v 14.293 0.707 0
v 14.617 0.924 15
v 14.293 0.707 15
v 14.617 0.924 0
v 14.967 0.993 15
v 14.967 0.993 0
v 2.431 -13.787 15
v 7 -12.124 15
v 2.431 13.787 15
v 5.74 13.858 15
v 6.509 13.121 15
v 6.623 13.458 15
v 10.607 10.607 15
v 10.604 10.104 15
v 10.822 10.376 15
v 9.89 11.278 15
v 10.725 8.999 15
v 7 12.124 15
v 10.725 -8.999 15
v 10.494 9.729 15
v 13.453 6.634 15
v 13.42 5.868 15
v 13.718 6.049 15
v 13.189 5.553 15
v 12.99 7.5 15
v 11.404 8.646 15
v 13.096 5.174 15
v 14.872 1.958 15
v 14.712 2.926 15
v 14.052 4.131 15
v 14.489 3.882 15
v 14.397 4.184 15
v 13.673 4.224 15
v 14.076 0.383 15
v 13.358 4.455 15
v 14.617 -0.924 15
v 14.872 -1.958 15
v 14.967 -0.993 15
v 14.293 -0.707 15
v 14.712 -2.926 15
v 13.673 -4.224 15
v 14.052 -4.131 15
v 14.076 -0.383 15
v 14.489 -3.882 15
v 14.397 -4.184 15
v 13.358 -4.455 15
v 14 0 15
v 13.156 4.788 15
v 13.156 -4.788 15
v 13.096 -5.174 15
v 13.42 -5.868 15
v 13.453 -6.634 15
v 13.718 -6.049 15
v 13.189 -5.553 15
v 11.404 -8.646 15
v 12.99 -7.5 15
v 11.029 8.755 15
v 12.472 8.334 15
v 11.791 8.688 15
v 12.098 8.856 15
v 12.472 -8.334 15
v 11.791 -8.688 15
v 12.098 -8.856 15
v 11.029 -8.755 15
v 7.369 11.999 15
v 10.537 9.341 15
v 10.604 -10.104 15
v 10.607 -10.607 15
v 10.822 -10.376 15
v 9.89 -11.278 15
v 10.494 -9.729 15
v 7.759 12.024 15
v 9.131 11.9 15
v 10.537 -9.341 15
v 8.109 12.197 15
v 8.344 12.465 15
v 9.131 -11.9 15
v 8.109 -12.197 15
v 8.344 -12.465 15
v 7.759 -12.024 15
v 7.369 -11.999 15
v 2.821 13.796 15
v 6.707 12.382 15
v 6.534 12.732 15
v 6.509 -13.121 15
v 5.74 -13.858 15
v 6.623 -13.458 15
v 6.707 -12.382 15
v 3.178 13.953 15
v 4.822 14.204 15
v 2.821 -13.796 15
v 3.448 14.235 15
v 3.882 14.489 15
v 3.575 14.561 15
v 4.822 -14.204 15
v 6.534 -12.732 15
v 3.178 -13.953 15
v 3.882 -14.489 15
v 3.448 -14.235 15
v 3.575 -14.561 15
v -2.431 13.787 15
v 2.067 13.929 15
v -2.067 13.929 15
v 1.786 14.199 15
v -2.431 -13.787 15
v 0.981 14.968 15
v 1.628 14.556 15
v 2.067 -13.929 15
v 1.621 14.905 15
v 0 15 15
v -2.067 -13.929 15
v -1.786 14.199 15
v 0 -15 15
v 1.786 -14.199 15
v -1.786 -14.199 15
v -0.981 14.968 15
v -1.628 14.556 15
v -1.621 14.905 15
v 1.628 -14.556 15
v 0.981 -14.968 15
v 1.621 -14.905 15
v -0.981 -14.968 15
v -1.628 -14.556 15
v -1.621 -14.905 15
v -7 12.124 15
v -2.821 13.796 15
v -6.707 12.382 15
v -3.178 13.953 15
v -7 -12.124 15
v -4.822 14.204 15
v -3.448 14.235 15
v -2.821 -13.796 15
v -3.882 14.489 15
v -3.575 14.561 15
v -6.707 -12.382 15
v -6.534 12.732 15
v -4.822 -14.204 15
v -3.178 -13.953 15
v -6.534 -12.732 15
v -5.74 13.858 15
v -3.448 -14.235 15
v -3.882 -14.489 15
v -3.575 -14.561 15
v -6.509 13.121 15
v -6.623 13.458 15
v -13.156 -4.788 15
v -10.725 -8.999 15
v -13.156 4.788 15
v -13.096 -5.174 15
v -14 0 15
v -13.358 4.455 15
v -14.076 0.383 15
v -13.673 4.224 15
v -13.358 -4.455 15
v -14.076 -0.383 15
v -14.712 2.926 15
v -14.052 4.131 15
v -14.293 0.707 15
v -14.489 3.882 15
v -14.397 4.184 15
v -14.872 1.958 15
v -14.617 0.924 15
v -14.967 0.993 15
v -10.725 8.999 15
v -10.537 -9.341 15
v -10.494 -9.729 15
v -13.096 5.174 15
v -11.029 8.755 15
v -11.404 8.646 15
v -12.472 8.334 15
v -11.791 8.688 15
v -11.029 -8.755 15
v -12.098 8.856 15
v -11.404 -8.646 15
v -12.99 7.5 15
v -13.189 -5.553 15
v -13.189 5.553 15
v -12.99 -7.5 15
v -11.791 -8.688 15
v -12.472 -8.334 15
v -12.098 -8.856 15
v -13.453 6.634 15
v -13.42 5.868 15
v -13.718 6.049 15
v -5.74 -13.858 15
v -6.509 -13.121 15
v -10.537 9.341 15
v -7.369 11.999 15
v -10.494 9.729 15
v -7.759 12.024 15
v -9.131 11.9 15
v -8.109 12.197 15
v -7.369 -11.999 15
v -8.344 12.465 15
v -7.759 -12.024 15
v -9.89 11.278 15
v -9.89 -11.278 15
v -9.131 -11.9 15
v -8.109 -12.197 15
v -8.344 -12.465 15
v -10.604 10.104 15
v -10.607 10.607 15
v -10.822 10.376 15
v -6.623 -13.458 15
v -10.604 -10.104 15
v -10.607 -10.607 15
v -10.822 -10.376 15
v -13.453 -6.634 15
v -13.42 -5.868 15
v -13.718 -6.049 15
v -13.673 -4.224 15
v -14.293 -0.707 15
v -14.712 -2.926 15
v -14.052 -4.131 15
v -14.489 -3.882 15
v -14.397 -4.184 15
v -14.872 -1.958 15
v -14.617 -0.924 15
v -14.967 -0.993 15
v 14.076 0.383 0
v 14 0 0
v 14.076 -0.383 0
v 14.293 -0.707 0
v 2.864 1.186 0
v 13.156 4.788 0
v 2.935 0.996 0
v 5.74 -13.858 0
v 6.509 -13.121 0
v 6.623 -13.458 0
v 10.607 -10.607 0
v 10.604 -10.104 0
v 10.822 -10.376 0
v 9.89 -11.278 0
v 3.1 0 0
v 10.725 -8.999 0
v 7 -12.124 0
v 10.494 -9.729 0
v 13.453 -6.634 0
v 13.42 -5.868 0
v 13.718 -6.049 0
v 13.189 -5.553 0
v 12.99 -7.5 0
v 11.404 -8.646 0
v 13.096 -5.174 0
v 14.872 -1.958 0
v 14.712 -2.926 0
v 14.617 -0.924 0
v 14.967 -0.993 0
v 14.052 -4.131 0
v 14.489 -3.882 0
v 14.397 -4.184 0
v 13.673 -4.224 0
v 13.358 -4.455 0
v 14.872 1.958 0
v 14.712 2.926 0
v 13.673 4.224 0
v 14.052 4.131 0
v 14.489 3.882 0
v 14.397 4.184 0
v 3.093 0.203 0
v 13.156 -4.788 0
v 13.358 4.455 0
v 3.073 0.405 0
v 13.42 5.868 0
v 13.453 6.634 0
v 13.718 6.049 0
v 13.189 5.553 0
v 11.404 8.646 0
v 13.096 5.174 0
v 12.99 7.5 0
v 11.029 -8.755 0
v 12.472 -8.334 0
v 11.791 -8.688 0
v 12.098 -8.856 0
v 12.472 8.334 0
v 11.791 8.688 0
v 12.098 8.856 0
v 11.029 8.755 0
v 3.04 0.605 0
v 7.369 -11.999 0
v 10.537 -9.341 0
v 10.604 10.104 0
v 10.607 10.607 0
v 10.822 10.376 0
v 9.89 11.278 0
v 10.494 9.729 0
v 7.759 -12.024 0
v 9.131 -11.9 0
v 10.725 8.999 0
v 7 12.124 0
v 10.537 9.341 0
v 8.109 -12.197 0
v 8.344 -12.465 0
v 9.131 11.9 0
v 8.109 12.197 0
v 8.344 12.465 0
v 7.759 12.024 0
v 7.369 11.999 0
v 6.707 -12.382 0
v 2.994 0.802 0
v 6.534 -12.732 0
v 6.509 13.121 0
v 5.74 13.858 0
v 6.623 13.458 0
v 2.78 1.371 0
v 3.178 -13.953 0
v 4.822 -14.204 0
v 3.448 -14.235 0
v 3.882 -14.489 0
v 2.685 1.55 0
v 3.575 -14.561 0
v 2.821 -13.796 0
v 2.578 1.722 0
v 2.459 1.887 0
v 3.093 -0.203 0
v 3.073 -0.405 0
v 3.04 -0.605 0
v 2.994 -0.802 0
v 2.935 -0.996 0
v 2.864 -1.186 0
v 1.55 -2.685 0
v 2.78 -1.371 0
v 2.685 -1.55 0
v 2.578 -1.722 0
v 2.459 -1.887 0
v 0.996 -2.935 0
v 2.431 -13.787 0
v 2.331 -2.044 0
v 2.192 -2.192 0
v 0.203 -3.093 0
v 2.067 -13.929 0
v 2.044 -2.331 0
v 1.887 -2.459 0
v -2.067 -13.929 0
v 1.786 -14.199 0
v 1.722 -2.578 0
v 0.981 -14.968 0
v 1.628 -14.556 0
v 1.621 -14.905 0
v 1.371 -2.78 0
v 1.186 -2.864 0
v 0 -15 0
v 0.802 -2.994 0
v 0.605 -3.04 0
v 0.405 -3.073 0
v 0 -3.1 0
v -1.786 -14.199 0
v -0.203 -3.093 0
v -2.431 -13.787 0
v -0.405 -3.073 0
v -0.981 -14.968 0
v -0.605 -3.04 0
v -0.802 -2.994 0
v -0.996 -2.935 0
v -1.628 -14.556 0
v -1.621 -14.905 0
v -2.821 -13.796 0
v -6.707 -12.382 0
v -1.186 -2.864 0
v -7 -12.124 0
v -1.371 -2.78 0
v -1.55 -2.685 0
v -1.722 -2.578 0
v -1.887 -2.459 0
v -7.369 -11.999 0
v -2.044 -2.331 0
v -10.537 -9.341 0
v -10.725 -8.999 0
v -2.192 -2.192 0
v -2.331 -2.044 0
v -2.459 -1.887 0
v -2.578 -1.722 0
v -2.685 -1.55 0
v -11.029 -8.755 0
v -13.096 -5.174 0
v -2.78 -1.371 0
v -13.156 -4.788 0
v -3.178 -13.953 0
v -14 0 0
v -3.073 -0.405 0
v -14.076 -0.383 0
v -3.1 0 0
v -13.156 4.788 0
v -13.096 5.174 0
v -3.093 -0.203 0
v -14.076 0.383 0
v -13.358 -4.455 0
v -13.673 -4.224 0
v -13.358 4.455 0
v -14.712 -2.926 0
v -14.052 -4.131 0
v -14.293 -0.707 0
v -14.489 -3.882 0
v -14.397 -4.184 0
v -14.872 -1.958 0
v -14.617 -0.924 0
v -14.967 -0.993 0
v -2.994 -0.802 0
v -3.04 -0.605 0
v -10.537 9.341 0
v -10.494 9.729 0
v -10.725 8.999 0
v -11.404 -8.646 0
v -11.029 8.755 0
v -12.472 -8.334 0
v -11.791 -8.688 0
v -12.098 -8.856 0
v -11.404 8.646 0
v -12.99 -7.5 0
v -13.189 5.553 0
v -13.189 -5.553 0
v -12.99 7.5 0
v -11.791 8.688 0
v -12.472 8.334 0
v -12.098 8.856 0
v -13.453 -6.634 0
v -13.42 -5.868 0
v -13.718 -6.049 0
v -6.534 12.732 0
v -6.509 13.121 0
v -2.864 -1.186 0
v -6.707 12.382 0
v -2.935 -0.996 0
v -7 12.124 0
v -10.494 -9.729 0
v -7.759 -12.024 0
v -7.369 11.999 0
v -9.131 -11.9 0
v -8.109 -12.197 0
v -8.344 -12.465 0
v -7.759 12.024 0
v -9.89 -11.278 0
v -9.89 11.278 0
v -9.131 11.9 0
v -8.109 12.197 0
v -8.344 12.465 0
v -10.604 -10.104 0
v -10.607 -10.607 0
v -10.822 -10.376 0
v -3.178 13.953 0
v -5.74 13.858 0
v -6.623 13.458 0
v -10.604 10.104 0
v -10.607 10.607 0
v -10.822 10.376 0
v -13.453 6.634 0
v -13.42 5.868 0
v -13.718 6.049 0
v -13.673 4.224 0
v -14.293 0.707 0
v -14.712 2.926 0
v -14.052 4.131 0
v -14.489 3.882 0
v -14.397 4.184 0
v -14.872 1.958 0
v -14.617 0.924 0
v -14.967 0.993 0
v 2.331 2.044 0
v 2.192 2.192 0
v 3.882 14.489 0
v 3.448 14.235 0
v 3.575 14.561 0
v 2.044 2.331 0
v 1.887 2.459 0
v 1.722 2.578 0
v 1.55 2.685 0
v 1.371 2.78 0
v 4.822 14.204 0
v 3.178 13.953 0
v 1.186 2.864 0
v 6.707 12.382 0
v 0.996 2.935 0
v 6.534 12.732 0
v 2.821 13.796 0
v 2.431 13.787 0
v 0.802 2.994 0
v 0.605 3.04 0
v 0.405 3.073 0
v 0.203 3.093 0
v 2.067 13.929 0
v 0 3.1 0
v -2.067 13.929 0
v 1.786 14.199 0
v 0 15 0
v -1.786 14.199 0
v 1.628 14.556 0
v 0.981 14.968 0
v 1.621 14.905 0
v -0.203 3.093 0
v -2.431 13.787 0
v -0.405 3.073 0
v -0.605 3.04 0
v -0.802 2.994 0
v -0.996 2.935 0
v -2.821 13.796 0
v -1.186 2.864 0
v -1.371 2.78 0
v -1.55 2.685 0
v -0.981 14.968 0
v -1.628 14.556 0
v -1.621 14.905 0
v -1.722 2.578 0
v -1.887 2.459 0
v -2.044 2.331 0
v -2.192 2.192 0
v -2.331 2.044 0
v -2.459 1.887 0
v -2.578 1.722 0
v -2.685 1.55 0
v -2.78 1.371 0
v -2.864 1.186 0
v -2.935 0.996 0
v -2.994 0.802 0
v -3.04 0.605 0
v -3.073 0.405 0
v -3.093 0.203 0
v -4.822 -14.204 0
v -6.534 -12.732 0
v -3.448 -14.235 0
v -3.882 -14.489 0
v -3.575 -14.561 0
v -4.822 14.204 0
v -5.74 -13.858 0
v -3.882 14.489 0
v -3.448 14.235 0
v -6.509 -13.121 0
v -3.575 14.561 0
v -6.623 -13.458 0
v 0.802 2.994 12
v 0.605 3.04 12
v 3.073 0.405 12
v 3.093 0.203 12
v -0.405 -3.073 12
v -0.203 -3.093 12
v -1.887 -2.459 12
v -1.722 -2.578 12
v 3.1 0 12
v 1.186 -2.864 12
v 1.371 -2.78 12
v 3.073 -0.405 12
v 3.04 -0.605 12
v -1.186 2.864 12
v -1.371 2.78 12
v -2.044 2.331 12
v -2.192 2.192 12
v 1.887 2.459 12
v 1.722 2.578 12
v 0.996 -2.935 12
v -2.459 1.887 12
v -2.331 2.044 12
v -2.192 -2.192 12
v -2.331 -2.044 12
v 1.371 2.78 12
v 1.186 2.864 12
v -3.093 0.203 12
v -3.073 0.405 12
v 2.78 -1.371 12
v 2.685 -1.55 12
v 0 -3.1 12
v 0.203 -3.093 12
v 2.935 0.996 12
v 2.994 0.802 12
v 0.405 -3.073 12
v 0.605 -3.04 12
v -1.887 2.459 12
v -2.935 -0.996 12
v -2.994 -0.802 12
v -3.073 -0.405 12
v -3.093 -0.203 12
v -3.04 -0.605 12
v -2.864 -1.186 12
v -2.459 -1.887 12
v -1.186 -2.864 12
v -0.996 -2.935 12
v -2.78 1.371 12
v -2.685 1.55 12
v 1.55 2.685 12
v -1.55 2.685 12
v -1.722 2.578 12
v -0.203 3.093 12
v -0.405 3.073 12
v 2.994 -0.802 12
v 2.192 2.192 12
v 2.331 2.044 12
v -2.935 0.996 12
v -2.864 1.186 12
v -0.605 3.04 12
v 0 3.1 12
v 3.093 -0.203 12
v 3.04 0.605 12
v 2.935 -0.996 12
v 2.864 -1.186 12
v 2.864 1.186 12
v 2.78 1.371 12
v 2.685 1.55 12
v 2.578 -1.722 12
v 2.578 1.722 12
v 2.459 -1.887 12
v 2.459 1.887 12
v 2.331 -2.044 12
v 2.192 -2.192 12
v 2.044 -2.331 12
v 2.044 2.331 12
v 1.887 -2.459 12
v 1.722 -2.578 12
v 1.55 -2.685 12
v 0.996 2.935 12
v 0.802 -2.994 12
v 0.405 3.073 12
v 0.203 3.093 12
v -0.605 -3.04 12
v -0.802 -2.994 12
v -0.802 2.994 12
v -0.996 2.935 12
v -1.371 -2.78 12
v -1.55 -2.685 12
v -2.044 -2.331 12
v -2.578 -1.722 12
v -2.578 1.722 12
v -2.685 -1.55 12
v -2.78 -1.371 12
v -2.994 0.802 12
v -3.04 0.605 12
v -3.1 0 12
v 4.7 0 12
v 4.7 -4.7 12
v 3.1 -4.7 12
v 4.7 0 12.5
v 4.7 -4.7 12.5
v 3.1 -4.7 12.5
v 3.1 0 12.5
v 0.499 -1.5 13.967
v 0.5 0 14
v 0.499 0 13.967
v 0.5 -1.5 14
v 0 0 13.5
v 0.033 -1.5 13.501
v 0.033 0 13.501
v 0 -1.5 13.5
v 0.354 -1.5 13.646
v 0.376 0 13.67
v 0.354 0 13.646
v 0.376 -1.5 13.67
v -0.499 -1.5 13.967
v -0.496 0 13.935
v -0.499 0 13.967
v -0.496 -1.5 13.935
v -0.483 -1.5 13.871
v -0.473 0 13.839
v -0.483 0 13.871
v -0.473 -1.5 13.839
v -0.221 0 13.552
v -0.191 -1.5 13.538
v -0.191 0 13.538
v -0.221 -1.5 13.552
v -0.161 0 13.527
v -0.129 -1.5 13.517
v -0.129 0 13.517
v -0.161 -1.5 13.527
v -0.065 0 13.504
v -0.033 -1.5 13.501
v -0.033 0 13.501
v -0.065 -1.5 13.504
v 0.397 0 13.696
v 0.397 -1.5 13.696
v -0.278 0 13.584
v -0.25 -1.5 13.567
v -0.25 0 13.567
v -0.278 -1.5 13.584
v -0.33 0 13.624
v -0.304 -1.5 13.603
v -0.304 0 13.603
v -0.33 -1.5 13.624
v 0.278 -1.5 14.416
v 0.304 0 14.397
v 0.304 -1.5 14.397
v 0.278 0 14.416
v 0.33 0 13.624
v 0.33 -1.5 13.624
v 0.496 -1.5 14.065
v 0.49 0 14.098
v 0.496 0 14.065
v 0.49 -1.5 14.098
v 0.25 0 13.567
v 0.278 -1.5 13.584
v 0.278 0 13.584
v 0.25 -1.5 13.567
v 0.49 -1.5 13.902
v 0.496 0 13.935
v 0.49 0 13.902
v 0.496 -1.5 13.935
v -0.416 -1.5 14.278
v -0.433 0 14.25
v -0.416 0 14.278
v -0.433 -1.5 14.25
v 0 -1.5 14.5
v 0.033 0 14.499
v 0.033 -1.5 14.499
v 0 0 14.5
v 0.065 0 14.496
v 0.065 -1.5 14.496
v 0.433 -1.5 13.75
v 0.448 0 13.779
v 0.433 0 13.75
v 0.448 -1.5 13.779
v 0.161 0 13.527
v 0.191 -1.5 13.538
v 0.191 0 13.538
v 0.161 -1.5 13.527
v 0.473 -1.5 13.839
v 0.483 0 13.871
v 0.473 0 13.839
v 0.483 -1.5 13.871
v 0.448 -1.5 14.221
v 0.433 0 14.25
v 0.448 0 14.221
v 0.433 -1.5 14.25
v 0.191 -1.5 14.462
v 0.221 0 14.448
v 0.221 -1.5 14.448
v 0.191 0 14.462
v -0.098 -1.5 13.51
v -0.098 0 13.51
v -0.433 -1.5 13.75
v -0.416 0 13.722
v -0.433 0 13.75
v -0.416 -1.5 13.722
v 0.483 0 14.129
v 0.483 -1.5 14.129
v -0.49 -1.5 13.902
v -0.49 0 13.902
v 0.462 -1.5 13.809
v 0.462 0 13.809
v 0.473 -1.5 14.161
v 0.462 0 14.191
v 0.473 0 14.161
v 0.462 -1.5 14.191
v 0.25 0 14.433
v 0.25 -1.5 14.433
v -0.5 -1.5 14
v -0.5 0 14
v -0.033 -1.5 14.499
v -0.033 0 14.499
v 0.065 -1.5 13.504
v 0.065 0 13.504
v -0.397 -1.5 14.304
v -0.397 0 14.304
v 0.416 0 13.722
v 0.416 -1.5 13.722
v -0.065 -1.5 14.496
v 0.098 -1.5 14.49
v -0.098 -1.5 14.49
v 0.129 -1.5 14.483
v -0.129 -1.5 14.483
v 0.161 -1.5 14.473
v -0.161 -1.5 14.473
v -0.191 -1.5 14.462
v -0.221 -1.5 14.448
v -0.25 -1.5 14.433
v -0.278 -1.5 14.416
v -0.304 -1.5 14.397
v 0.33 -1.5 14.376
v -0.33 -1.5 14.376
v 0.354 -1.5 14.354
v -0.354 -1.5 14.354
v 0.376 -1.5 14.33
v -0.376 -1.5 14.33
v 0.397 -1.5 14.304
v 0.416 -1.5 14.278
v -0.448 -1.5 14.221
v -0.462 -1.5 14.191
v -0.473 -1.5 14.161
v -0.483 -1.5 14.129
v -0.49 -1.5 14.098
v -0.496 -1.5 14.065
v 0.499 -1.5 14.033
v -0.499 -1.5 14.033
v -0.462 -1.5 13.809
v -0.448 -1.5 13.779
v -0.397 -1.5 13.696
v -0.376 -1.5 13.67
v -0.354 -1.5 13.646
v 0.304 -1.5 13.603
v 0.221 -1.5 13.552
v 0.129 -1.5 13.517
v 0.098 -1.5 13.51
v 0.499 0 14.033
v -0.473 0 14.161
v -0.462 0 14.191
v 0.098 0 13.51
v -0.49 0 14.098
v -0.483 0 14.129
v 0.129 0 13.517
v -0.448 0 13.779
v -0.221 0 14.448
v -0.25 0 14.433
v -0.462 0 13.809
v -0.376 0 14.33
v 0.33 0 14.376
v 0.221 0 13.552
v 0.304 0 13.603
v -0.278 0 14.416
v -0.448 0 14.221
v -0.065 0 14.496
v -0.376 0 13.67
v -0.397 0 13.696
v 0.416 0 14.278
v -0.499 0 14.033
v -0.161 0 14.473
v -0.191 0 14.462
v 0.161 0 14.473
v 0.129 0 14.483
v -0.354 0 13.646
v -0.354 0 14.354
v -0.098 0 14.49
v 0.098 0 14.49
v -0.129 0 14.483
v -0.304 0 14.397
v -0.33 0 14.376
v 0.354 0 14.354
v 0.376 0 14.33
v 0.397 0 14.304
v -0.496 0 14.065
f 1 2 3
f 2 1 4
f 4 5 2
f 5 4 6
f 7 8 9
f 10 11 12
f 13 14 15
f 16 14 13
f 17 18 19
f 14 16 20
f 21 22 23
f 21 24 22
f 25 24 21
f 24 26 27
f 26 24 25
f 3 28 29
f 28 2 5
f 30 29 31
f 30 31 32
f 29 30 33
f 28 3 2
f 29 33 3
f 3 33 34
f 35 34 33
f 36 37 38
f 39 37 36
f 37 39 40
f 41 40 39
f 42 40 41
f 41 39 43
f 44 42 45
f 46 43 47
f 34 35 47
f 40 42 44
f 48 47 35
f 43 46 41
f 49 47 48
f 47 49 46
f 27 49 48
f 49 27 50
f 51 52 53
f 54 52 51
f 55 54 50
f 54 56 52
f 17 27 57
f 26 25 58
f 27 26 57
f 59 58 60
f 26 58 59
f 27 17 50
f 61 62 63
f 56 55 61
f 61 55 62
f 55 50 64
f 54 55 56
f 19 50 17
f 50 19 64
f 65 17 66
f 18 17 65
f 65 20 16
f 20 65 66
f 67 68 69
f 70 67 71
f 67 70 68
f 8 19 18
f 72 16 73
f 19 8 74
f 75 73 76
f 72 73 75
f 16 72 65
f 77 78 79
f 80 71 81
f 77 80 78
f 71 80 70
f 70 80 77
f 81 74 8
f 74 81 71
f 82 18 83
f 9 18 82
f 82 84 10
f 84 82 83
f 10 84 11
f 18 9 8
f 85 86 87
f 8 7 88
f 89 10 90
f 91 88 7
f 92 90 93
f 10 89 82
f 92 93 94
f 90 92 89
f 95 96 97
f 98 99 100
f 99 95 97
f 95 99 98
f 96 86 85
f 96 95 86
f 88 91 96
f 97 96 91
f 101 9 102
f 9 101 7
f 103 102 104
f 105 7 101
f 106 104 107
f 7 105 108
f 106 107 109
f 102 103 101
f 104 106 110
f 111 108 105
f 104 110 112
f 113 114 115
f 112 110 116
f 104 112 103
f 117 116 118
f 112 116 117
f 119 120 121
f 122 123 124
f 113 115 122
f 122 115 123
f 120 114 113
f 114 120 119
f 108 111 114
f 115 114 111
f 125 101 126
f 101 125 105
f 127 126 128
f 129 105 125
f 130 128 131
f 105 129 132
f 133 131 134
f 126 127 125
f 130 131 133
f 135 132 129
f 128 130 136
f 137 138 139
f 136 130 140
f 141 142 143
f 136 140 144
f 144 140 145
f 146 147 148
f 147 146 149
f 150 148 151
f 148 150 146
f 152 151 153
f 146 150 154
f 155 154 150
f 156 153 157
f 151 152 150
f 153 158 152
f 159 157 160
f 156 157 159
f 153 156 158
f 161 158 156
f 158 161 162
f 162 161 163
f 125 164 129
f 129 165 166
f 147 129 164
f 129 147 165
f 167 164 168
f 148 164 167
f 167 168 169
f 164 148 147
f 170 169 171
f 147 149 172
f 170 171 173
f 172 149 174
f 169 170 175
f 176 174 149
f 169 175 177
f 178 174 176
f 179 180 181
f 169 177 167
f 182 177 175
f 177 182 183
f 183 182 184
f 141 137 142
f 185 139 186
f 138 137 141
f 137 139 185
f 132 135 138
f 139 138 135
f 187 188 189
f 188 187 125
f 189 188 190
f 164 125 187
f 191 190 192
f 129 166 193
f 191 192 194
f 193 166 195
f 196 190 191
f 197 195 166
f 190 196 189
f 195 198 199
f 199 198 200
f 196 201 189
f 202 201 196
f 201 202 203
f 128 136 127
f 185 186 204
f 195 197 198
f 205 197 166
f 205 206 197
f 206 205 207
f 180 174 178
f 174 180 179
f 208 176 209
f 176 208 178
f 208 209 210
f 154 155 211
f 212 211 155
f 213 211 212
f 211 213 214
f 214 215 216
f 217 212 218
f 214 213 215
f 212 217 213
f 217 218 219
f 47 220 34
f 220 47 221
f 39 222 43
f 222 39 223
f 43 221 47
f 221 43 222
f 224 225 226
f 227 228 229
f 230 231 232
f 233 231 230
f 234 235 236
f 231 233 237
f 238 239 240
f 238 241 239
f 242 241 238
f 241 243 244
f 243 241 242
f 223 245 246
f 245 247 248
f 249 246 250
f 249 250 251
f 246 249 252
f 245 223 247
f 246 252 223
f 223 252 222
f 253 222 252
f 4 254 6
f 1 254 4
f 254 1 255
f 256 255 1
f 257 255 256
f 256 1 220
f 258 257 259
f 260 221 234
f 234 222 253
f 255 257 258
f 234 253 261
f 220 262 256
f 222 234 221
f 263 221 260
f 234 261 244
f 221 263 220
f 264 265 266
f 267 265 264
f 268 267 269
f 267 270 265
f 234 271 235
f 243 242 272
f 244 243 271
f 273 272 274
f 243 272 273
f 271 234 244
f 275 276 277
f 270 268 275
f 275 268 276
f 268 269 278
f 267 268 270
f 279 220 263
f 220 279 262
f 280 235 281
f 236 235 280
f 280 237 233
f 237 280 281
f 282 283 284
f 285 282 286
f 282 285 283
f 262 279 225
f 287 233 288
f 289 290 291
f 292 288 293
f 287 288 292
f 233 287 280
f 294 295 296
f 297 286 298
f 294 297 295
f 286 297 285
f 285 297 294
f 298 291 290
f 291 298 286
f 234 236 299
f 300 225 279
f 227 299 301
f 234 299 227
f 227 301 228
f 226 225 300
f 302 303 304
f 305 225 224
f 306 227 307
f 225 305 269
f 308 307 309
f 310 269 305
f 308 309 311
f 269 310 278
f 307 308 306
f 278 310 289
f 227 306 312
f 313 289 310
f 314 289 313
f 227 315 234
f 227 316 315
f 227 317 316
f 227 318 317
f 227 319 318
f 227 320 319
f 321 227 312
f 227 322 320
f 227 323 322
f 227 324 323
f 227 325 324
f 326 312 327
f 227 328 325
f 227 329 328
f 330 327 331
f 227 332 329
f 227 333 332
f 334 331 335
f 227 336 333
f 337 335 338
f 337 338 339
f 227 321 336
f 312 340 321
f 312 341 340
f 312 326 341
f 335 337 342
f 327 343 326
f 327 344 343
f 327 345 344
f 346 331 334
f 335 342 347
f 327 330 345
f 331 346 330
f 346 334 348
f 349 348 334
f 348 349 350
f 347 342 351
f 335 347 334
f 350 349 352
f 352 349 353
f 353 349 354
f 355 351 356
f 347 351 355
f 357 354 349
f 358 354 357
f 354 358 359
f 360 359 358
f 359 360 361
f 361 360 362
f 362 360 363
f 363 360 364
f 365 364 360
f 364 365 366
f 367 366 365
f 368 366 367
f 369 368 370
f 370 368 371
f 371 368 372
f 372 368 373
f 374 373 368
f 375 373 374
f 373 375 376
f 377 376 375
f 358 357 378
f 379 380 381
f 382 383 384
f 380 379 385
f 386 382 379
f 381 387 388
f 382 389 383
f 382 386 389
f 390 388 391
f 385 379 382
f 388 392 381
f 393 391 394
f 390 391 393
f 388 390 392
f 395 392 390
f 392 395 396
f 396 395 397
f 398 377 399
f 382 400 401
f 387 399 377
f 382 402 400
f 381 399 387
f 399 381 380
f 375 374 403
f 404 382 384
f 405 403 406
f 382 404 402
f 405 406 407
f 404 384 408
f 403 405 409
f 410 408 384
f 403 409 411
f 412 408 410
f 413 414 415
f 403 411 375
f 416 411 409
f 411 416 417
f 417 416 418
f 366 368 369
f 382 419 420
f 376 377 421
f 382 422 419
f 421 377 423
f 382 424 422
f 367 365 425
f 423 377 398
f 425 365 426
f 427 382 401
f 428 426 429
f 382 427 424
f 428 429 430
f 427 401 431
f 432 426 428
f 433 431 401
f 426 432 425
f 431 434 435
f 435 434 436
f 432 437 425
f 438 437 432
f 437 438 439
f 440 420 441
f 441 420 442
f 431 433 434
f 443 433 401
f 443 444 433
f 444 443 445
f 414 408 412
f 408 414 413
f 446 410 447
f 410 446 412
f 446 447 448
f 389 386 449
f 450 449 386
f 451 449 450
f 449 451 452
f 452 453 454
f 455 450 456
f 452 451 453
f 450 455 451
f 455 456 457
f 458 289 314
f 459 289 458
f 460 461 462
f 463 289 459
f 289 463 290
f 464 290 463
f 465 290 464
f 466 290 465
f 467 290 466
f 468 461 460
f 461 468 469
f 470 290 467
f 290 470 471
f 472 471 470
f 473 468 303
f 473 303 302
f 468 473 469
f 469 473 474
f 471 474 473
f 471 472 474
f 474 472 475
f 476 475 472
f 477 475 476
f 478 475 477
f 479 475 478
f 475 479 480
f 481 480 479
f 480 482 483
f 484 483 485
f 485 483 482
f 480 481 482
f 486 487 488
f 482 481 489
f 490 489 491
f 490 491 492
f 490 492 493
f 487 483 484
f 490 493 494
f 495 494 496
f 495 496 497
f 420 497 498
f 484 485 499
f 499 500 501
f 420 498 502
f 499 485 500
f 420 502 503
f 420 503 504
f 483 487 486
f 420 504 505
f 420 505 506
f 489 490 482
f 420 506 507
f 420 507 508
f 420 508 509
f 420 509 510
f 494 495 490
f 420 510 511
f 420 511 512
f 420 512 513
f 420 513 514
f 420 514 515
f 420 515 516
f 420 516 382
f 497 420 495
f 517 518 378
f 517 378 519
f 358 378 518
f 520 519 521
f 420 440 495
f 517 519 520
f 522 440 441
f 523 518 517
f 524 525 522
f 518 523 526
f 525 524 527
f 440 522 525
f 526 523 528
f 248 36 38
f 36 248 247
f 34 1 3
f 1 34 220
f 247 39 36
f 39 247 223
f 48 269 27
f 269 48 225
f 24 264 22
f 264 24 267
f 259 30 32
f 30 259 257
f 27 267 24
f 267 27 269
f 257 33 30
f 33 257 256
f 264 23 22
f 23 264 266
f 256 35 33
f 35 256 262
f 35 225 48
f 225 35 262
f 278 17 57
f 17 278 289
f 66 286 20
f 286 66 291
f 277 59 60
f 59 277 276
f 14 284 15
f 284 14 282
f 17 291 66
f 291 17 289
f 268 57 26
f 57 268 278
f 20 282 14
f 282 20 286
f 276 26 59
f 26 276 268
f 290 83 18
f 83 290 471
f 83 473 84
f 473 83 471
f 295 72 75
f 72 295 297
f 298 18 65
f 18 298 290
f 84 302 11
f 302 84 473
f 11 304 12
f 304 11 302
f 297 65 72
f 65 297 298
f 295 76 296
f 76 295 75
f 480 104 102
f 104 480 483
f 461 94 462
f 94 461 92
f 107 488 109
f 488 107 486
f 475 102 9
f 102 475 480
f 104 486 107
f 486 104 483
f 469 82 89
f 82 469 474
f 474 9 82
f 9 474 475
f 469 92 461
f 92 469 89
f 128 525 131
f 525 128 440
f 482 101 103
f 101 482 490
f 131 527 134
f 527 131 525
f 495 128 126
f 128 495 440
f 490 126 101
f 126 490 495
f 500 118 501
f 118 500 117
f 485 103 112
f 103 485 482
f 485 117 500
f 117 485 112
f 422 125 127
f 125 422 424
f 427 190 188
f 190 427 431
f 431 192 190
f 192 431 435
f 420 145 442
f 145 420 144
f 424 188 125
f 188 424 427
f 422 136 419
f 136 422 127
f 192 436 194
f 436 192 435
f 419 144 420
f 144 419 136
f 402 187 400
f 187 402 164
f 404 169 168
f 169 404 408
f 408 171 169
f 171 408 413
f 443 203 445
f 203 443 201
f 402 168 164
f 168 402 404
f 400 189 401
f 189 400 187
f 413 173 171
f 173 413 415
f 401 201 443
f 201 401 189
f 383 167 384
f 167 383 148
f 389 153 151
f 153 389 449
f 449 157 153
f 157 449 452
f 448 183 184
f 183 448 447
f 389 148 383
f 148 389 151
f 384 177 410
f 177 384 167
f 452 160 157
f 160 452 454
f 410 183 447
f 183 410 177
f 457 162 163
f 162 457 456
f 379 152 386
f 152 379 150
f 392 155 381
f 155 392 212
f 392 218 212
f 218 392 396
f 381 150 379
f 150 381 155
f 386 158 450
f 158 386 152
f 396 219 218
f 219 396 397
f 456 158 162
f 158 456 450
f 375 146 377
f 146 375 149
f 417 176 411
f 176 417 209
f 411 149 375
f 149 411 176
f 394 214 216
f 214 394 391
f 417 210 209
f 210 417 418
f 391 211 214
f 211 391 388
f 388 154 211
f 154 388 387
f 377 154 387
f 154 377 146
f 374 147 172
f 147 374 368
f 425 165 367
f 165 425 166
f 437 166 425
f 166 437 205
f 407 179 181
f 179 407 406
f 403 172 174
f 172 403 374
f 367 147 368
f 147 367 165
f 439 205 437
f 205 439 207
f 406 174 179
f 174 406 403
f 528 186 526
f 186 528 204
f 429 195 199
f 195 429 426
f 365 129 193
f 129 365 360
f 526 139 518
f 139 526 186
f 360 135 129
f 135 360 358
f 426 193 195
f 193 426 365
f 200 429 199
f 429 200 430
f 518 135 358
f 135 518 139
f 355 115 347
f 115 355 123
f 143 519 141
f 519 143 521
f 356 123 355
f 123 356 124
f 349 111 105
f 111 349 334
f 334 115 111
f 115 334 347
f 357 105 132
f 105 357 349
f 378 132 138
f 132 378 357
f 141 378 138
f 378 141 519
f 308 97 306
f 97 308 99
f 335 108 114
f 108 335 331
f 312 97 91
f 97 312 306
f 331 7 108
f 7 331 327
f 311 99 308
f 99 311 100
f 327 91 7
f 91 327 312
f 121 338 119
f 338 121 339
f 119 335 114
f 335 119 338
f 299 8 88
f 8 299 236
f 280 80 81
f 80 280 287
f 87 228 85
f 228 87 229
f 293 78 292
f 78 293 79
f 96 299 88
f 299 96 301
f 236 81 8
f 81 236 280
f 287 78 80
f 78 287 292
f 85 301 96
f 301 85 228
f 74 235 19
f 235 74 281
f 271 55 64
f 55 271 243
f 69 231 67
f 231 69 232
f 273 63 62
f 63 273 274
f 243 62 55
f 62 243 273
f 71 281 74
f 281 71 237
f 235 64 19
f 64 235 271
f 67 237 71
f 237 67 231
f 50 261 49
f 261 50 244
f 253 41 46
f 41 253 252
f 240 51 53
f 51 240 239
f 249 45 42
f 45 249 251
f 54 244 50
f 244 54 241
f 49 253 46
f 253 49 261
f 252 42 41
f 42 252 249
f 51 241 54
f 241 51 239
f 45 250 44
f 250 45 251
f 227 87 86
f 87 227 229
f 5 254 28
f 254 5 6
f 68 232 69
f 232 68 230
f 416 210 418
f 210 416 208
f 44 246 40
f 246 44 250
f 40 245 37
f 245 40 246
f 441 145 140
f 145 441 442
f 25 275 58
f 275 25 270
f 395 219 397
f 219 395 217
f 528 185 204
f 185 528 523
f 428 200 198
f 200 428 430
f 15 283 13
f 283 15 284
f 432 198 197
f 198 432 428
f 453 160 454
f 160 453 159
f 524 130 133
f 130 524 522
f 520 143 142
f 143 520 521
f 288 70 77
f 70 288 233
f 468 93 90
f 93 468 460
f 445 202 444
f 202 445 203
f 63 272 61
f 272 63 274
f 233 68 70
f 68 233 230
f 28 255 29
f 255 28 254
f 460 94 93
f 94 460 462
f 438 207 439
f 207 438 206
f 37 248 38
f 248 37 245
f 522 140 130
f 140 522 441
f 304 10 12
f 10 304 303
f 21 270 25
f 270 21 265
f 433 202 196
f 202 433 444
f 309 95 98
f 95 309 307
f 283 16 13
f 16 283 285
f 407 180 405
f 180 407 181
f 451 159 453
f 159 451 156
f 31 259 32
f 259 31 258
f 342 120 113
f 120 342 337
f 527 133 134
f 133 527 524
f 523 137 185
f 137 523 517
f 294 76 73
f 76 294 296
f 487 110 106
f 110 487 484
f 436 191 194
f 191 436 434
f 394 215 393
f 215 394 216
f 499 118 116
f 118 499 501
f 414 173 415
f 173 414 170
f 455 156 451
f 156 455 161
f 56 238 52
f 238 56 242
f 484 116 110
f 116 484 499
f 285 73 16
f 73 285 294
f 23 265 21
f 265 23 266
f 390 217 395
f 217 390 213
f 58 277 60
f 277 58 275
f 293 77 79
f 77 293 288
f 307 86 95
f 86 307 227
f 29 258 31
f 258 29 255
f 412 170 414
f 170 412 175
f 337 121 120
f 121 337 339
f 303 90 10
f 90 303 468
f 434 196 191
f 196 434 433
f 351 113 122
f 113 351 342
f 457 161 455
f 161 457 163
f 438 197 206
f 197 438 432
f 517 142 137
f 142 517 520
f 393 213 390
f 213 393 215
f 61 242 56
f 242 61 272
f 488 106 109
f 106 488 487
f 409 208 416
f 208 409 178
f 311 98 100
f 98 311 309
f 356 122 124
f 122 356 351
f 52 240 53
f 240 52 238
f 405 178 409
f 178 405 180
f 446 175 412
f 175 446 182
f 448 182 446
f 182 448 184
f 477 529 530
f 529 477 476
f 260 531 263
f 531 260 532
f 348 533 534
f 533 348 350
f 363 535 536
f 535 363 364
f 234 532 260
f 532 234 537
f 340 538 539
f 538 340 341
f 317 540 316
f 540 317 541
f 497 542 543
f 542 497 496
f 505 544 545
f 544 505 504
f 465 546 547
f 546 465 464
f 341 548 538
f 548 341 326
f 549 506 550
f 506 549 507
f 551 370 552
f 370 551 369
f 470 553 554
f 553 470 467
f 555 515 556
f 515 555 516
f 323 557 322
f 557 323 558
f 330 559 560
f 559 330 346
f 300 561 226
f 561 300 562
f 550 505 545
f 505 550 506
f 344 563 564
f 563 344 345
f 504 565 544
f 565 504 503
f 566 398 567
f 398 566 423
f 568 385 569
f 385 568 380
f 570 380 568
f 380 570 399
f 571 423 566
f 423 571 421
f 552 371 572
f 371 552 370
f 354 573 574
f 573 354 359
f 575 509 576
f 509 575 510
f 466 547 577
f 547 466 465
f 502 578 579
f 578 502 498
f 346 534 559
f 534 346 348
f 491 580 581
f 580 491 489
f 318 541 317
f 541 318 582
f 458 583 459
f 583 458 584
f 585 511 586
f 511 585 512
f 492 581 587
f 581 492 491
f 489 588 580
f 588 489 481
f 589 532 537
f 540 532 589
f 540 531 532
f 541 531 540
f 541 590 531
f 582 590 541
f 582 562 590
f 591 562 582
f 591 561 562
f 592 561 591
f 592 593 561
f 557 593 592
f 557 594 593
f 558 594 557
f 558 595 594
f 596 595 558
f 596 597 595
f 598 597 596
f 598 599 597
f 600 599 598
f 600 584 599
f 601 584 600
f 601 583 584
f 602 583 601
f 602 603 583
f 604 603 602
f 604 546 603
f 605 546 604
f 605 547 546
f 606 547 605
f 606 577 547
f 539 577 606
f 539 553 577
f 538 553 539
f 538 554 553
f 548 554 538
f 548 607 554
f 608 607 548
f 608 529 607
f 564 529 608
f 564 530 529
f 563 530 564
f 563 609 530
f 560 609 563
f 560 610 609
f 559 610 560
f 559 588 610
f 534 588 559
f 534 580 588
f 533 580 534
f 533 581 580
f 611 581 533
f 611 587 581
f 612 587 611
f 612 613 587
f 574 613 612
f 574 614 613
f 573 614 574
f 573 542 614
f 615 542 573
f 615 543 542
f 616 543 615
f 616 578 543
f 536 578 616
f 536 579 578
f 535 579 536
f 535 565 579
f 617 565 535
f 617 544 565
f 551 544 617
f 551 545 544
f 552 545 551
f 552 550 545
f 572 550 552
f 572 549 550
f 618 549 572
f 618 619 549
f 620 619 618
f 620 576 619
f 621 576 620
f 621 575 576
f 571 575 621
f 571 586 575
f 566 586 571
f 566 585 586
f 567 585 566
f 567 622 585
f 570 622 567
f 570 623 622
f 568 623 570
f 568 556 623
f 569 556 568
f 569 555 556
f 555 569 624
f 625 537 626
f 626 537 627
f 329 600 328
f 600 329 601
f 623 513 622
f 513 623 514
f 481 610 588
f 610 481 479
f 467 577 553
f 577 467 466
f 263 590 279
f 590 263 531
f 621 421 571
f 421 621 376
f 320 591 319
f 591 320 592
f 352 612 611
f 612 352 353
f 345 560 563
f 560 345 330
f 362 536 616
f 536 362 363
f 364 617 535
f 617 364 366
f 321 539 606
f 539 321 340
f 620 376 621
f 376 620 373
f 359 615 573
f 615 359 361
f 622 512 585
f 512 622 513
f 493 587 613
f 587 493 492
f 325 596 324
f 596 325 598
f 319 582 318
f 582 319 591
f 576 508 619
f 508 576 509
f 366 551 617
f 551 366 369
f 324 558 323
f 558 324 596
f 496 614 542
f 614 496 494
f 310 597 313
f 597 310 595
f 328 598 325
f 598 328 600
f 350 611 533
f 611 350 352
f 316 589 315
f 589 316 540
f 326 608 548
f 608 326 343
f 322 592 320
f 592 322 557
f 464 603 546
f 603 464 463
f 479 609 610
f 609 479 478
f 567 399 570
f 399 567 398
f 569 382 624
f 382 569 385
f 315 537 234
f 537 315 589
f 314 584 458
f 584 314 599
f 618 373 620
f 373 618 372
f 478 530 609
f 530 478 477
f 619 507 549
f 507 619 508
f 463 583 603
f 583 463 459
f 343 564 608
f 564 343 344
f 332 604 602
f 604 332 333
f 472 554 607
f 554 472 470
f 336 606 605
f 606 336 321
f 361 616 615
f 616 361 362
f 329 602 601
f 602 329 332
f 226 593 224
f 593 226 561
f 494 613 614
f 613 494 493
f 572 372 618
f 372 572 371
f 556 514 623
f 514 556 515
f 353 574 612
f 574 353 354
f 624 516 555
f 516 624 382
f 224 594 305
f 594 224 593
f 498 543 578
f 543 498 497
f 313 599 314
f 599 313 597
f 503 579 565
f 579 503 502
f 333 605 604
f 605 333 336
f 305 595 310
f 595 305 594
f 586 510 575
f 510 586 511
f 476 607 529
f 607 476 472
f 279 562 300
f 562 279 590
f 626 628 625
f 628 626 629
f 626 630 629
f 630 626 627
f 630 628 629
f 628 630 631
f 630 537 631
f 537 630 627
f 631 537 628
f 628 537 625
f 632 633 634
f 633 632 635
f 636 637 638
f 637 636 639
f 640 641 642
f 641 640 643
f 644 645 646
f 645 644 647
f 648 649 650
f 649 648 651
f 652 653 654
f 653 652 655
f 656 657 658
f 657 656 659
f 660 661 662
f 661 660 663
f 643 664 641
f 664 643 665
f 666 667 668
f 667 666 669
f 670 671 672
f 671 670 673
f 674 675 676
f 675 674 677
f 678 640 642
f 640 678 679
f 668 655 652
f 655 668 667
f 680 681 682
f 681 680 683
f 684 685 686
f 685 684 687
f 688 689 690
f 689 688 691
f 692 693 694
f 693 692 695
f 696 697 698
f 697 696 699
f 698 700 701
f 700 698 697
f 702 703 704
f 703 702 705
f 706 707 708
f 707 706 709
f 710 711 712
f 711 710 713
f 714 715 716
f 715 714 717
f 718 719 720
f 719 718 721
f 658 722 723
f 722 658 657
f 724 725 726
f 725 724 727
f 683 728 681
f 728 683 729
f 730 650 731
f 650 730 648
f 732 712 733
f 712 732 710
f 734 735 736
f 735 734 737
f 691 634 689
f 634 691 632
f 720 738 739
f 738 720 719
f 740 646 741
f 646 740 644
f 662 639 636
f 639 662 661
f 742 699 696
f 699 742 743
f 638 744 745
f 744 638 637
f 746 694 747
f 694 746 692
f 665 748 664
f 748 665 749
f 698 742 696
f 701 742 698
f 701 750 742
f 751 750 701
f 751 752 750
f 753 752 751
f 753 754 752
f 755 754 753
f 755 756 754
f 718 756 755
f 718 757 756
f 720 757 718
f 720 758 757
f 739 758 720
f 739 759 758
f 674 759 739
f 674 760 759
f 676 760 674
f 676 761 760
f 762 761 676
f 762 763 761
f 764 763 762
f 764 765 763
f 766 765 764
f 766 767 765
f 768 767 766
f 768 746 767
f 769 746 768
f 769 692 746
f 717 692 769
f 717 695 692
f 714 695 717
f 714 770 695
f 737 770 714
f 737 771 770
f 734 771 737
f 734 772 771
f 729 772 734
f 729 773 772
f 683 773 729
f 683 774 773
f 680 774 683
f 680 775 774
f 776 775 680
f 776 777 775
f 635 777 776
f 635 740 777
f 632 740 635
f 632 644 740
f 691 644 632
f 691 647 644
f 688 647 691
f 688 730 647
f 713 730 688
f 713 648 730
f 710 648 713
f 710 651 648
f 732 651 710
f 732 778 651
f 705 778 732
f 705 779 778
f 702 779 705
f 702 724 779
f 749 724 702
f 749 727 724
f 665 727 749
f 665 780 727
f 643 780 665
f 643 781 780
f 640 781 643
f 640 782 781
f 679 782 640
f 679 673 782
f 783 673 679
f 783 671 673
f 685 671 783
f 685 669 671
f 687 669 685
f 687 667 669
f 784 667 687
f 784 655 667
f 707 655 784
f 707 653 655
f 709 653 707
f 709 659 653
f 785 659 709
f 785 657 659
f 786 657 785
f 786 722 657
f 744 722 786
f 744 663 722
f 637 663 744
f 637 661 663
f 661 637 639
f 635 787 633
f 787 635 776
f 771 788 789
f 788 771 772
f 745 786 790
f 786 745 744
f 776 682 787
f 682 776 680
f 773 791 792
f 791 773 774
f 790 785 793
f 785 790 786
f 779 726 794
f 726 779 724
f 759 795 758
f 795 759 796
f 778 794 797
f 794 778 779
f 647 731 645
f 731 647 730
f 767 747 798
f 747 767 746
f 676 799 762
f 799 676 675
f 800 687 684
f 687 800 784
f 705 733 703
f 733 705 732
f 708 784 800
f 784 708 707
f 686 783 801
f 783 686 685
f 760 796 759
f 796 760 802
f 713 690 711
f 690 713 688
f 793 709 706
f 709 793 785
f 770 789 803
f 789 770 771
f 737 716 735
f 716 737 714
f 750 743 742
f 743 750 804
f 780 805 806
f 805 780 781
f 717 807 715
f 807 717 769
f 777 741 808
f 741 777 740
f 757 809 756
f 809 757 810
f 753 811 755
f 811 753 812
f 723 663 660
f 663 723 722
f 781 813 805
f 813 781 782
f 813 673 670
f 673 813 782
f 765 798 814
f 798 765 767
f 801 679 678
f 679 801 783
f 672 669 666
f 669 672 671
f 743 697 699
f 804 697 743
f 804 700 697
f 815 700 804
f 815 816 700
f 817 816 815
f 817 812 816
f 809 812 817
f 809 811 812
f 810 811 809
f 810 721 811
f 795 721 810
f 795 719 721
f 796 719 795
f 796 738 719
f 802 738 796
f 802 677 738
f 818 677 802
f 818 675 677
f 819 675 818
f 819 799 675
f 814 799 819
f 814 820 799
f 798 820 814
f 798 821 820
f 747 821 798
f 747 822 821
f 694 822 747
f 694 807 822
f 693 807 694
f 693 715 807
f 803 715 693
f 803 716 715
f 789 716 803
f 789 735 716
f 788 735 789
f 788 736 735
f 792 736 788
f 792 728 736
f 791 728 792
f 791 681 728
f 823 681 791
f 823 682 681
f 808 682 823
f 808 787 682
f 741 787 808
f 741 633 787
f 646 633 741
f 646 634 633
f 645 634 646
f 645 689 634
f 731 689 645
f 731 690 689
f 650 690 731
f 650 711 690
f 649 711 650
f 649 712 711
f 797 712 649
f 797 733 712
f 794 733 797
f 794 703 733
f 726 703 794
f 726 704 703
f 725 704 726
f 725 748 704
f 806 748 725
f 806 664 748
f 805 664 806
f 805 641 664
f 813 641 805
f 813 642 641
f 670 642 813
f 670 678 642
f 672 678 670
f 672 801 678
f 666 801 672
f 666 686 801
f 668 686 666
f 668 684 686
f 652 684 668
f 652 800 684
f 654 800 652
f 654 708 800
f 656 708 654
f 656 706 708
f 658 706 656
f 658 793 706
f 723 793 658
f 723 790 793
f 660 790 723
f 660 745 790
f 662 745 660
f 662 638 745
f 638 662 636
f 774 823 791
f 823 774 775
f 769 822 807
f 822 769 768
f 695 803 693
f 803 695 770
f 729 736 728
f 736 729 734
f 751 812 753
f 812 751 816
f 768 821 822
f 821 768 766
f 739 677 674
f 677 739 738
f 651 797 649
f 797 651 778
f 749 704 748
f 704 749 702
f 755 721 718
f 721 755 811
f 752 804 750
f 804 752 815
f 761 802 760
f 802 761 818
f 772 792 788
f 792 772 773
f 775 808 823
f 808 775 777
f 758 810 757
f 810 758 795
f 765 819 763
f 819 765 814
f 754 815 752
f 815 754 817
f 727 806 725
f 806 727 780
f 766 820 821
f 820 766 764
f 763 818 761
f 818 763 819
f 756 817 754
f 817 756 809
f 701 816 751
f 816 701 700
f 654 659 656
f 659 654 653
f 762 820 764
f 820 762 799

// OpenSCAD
// Replacement knob for a hotplate stirrer with a 6 mm D-shaft
// Print orientation: bottom face (with D-bore) on the bed, z = 0

// ---------------- Parameters ----------------
knob_d        = 30;    // knob outer diameter
knob_h        = 15;    // knob height
shaft_d       = 6.2;   // D-shaft bore diameter
flat_dist     = 4.7;   // distance from D-flat to opposite side of circle
groove_count  = 18;    // number of vertical grip grooves
groove_d      = 2;     // groove diameter (half-cylinder)
pointer_w     = 1.5;   // pointer groove width
pointer_d     = 1;     // pointer groove depth
eps           = 0.5;   // overshoot for clean boolean cuts

$fn = 96;

// ---------------- Model ----------------
difference() {
    // Main body
    cylinder(d = knob_d, h = knob_h);

    // D-shaped blind bore from the bottom face
    translate([0, 0, 0])
        linear_extrude(height = 12)
            circle(d = shaft_d);
    // Cut the flat side of the D (through the extruded piece)
    translate([0, 0, 12])
        linear_extrude(height = eps)
            polygon([
                [shaft_d / 2, 0],
                [flat_dist, 0],
                [flat_dist, -flat_dist],
                [shaft_d / 2, -flat_dist]
            ]);

    // Vertical grip grooves around the outside, full height
    for (i = [0 : groove_count - 1])
        rotate([0, 0, i * 360 / groove_count])
            translate([knob_d / 2, 0, 0])
                cylinder(d = groove_d, h = knob_h, $fn = 16);

    // Pointer groove on the top face, from centre to outer edge
    // placed on the same side as the D-flat (positive X)
    translate([0, 0, knob_h - pointer_d])
        rotate([90, 0, 0])
            linear_extrude(height = pointer_w)
                circle(d = pointer_d);
}
